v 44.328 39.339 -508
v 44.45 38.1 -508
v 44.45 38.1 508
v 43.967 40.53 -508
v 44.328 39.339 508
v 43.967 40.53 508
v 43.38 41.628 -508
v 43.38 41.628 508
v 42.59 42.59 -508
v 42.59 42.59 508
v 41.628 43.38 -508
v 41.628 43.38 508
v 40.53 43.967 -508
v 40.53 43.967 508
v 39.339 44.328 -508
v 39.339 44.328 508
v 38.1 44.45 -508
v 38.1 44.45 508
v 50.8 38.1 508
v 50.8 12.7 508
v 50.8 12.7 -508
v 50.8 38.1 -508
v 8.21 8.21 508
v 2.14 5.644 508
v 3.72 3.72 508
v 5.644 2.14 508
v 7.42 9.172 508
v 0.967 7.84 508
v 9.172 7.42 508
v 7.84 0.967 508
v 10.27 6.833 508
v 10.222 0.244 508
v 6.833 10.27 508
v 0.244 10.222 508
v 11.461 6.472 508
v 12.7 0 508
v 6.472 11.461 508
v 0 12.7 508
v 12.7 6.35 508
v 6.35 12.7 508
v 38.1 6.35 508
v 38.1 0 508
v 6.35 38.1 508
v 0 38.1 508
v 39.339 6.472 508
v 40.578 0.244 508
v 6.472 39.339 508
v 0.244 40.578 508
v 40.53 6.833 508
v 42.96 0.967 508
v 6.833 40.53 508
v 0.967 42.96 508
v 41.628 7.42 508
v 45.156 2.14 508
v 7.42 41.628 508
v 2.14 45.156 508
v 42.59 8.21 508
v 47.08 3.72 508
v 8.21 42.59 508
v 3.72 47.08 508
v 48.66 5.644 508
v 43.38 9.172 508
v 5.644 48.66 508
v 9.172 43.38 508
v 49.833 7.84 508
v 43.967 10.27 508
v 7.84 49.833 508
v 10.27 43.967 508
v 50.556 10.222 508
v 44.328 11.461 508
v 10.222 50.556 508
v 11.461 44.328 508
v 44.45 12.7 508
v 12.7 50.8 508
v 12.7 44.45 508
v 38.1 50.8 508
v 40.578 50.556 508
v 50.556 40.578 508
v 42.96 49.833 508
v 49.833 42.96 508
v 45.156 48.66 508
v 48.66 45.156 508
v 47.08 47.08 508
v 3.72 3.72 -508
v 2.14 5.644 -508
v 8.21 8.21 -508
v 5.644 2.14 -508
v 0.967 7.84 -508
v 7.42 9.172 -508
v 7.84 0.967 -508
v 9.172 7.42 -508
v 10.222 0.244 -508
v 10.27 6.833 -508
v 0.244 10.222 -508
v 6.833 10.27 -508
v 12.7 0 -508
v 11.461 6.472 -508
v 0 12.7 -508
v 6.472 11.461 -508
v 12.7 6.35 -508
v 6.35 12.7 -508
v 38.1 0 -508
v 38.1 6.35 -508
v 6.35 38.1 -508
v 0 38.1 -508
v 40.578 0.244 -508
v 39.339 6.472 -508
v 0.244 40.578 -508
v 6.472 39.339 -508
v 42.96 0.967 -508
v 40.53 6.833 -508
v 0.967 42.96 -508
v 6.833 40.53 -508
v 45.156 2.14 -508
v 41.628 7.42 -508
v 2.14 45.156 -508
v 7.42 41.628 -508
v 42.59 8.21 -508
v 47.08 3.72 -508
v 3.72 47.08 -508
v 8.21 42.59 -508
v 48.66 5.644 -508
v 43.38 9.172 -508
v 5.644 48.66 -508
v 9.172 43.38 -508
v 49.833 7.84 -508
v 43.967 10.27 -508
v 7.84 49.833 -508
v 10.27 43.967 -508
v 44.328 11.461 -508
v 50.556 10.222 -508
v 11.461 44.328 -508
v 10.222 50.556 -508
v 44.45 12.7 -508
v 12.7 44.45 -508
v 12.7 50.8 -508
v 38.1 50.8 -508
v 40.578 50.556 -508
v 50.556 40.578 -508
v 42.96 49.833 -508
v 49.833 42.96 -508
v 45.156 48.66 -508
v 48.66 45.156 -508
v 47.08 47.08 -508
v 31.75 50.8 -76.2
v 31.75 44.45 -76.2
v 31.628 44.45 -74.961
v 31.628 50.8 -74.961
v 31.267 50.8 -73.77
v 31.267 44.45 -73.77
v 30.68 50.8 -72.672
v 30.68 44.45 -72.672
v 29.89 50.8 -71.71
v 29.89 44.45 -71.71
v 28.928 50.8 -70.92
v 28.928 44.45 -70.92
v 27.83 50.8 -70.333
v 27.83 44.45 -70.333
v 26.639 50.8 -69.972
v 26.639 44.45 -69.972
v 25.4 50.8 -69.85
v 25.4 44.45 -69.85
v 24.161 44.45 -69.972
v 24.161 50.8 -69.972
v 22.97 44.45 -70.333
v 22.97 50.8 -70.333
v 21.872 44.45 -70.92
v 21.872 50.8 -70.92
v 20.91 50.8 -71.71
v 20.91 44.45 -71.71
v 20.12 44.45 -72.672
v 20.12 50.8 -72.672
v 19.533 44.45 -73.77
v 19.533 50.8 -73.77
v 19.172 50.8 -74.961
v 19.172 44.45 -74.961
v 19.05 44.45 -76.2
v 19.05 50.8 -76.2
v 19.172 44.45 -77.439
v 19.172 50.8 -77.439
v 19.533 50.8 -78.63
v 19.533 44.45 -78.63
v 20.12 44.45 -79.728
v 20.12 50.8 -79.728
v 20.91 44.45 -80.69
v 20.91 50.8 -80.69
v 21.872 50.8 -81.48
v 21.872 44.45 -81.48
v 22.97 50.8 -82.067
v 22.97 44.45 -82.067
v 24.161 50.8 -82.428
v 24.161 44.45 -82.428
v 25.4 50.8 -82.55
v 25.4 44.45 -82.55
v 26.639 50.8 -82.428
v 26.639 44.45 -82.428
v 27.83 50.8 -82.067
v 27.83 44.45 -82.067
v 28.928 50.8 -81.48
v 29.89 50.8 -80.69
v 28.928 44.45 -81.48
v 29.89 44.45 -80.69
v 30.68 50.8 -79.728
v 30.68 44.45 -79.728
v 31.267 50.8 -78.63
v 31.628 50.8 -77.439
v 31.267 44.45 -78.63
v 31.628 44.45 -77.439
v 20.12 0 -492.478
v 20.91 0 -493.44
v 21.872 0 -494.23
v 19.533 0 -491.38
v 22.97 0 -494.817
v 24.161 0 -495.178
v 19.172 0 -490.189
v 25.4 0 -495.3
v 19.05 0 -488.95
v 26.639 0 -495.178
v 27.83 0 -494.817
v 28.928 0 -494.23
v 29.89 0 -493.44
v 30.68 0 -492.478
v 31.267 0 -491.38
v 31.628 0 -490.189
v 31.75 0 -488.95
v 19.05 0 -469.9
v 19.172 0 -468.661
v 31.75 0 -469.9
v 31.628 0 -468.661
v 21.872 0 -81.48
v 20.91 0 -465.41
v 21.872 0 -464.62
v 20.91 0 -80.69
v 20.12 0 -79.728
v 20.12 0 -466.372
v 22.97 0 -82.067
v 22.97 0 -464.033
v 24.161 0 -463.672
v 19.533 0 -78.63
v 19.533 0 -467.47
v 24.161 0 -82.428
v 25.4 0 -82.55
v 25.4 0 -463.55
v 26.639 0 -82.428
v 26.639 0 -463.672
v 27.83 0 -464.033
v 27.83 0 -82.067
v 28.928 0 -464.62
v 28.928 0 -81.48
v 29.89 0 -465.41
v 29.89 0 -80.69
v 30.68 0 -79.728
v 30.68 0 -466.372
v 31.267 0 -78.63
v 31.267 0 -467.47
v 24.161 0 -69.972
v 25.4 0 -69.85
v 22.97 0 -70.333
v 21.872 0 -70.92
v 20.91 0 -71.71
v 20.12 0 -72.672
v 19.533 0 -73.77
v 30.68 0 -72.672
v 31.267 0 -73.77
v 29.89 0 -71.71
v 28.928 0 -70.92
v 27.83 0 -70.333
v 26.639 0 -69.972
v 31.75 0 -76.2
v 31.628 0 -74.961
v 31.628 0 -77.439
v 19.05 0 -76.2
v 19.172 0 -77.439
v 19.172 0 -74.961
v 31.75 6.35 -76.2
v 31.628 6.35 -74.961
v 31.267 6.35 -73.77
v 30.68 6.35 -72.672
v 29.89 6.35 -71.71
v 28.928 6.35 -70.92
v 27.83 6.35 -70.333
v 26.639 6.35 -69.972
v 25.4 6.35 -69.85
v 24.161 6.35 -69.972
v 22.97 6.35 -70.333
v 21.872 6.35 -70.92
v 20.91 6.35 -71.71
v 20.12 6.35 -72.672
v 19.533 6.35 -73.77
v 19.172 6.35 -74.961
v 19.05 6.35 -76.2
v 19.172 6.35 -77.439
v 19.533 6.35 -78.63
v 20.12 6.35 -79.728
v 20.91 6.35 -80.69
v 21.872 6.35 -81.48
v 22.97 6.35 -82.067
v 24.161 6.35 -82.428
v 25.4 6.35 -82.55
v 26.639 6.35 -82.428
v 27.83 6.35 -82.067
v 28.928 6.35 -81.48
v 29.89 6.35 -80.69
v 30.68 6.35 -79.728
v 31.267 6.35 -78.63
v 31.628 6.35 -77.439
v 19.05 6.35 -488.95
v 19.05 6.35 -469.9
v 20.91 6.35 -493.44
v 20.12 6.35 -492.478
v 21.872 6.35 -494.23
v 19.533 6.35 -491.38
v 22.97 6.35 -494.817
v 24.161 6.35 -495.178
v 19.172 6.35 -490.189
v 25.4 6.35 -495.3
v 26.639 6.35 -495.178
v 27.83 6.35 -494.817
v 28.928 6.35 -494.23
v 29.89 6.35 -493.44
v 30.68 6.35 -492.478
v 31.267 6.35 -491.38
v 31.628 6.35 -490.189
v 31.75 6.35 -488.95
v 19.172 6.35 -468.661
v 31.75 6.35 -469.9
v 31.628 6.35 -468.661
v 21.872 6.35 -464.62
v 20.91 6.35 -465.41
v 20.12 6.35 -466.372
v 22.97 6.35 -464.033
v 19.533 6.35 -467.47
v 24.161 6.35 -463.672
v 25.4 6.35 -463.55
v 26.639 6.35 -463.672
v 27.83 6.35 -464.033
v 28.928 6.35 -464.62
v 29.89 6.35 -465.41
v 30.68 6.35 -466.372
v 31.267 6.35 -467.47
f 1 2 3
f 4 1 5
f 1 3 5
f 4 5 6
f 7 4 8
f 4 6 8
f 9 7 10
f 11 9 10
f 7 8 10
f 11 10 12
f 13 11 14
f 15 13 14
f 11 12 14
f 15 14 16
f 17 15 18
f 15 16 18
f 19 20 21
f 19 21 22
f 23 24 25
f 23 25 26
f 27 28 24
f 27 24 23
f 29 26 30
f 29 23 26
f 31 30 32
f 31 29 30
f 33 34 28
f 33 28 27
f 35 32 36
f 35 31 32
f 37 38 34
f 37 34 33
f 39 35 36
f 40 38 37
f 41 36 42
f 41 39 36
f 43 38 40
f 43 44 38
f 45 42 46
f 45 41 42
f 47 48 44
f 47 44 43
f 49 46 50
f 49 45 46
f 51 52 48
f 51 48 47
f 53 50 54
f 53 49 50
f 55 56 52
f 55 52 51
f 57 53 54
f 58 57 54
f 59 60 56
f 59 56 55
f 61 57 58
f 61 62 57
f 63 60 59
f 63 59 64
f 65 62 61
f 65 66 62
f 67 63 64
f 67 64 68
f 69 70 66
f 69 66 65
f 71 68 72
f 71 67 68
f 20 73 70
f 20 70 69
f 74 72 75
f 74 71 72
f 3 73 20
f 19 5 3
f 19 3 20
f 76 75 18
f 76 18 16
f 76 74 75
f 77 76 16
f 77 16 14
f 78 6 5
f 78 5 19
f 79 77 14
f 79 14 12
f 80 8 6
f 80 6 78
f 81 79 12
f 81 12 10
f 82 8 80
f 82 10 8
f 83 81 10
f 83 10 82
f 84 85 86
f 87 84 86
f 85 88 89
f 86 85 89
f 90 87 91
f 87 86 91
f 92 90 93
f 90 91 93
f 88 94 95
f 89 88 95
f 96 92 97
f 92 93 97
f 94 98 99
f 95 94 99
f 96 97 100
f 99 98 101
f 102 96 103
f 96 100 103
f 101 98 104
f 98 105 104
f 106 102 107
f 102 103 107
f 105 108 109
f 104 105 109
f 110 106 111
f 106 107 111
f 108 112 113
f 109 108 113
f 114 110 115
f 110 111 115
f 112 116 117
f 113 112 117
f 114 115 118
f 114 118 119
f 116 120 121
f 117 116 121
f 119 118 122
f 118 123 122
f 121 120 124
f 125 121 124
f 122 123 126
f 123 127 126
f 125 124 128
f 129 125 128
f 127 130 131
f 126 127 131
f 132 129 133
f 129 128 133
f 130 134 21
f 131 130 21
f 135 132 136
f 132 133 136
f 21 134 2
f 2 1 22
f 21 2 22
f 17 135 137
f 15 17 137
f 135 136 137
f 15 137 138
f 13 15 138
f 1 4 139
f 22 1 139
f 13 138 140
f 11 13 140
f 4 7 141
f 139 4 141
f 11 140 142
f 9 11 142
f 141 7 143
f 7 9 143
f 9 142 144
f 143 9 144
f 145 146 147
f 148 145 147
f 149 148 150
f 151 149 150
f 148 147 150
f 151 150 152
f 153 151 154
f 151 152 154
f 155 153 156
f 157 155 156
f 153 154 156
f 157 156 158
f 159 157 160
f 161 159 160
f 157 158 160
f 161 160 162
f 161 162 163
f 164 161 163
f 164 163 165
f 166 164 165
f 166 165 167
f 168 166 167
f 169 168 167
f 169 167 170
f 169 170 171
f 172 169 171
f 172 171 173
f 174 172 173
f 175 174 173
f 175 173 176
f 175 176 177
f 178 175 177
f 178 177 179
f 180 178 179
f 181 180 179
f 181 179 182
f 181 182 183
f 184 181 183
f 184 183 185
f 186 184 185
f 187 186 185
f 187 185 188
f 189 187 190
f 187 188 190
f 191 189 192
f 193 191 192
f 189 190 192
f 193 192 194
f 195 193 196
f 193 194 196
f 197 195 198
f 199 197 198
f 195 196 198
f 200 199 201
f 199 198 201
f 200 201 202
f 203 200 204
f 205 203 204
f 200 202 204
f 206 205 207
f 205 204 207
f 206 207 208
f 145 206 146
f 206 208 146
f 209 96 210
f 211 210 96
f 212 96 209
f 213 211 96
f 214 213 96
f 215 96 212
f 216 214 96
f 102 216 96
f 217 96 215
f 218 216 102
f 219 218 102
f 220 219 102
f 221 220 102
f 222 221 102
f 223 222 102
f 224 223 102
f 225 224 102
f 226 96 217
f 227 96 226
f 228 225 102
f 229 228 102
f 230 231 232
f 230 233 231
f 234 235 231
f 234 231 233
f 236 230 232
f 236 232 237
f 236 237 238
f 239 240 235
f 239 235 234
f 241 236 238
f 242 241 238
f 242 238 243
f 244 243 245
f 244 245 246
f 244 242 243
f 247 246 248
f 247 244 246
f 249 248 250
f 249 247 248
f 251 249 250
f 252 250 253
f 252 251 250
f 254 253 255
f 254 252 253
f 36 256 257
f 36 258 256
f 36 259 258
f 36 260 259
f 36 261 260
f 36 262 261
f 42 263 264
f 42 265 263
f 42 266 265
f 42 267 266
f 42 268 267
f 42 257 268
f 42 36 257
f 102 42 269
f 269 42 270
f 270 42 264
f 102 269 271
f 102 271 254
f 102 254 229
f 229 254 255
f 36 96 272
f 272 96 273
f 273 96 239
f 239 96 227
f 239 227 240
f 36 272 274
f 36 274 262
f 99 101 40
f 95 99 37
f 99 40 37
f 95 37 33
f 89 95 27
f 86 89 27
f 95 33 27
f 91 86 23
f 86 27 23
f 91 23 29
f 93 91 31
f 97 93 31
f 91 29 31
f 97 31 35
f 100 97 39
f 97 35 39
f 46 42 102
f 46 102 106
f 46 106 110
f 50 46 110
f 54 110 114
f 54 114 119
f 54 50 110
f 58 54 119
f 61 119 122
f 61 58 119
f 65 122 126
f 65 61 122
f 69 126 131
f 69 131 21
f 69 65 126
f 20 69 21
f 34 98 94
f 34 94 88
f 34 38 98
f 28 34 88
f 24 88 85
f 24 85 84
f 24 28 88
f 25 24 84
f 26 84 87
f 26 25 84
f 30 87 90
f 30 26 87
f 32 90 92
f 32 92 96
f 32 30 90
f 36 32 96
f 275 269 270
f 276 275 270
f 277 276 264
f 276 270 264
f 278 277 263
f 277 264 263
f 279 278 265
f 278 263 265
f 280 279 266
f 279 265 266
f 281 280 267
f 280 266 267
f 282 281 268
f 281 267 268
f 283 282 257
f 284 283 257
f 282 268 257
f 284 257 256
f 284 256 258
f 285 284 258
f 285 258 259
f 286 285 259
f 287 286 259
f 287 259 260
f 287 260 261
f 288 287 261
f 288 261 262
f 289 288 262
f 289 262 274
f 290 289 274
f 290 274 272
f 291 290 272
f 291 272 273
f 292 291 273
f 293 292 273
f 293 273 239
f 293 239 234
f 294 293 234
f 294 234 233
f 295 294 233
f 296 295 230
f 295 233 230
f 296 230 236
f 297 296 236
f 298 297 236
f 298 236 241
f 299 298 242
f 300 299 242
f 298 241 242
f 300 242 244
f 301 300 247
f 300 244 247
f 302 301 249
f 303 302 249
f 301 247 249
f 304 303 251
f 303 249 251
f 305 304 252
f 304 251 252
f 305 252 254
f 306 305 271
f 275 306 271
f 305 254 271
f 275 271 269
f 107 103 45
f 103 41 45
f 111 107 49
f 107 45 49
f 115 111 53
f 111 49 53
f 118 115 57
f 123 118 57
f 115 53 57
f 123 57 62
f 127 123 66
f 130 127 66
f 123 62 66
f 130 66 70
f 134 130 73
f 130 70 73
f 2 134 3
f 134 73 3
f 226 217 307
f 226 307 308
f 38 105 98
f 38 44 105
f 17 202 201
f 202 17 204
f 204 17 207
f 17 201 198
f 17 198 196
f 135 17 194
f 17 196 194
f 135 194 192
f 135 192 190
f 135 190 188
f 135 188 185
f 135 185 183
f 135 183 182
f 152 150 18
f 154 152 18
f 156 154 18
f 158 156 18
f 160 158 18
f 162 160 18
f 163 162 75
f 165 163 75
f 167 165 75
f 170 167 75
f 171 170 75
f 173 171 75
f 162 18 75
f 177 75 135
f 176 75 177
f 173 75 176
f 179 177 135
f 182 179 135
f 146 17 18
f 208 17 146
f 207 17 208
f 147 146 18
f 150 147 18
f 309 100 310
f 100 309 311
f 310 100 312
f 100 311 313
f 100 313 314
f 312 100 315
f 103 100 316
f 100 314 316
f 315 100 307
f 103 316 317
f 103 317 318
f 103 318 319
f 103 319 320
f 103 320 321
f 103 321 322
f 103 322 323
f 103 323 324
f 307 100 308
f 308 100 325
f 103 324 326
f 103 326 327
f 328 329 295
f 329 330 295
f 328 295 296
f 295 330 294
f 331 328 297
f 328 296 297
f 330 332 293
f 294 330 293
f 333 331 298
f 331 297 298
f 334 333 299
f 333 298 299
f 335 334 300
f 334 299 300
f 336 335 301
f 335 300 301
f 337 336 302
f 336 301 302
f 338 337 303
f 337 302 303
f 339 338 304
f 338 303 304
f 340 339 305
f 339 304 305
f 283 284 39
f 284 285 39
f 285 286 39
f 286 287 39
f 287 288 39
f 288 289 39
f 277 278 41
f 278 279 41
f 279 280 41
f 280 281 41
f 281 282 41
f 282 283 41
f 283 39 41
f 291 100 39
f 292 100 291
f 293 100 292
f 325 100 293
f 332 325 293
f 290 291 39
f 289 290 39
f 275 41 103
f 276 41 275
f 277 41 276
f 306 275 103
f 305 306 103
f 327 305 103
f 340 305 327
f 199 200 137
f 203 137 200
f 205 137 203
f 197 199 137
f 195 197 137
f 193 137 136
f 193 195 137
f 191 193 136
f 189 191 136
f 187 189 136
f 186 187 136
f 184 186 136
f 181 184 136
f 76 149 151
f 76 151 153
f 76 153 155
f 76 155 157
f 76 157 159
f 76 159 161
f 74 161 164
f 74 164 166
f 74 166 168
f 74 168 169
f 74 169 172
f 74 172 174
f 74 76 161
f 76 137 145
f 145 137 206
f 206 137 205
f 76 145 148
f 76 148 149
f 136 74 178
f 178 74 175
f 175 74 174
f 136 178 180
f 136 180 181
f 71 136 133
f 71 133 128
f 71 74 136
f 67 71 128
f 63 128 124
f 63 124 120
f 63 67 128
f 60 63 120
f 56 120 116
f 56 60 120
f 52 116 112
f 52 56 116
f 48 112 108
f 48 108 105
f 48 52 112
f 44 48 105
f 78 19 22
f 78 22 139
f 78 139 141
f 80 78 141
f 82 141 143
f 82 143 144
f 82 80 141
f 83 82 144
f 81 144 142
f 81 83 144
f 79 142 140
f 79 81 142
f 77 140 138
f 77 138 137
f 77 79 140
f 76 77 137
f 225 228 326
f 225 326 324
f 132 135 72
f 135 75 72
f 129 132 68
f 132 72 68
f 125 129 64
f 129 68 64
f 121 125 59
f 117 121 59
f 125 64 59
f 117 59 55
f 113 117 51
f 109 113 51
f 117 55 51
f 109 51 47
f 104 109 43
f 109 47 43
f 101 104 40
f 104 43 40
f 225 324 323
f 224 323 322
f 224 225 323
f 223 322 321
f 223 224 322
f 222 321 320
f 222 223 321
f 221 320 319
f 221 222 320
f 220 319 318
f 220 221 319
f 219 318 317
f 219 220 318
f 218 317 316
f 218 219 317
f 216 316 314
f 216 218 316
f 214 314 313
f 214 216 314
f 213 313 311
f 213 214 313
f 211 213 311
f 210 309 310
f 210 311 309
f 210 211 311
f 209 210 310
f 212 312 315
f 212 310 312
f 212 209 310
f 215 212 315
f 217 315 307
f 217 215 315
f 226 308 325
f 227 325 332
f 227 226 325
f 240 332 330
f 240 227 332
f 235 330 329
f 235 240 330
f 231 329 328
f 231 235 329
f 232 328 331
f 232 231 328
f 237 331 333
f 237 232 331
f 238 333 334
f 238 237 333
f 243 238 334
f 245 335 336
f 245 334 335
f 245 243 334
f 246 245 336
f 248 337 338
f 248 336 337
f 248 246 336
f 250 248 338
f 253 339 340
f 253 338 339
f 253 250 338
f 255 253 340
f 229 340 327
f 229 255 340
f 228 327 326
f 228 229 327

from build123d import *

# Parameters (mm, degrees)
BOSS_EXTRUDE1_DEPTH        = 508
F_1_2_0_5_DIAMETER_HOLE1_D = 12.7
CUT_EXTRUDE3_REACH         = 52.8


with BuildPart() as part:
    # Sketch1 → Boss-Extrude1 (new body, symmetric)
    with BuildSketch(Plane.XY):
        with BuildLine():
            Line((12.7, 0), (38.1, 0))
            ThreePointArc((38.1, 0), (47.080256121, 3.719743879), (50.8, 12.7))
            Line((50.8, 12.7), (50.8, 38.1))
            ThreePointArc((50.8, 38.1), (47.080256121, 47.080256121), (38.1, 50.8))
            Line((38.1, 50.8), (12.7, 50.8))
            ThreePointArc((12.7, 50.8), (3.719743879, 47.080256121), (0, 38.1))
            Line((0, 38.1), (0, 12.7))
            ThreePointArc((0, 12.7), (3.719743879, 3.719743879), (12.7, 0))
        make_face()
        with BuildLine():
            Line((12.7, 6.35), (38.1, 6.35))
            ThreePointArc((38.1, 6.35), (42.590128061, 8.209871939), (44.45, 12.7))
            Line((44.45, 12.7), (44.45, 38.1))
            ThreePointArc((44.45, 38.1), (42.590128061, 42.590128061), (38.1, 44.45))
            Line((38.1, 44.45), (12.7, 44.45))
            ThreePointArc((12.7, 44.45), (8.209871939, 42.590128061), (6.35, 38.1))
            Line((6.35, 38.1), (6.35, 12.7))
            ThreePointArc((6.35, 12.7), (8.209871939, 8.209871939), (12.7, 6.35))
        make_face(mode=Mode.SUBTRACT)
    extrude(amount=BOSS_EXTRUDE1_DEPTH, both=True)

    # 1/2 (0.5) Diameter Hole1 (through all)
    with Locations(Plane(origin=(0, 50.8, 0), x_dir=(-1, 0, 0), z_dir=(0, 1, 0))):
        with Locations((-25.4, -76.2)):
            Hole(F_1_2_0_5_DIAMETER_HOLE1_D / 2)

    # Sketch9 → Cut-Extrude3 (cut, up to next)
    with BuildSketch(Plane.XZ, mode=Mode.PRIVATE) as cut_extrude3_sk1:
        with BuildLine():
            Line((19.05, -488.95), (19.05, -469.9))
            ThreePointArc((19.05, -469.9), (25.4, -463.55), (31.75, -469.9))
            Line((31.75, -469.9), (31.75, -488.95))
            ThreePointArc((31.75, -488.95), (25.4, -495.3), (19.05, -488.95))
        make_face()
    cut_extrude3_tool1 = extrude(cut_extrude3_sk1.sketch, amount=-CUT_EXTRUDE3_REACH, mode=Mode.PRIVATE) & part.part
    add(cut_extrude3_tool1.solids().sort_by_distance((25.4, 0, -479.425))[0], mode=Mode.SUBTRACT)


solid = part.part
